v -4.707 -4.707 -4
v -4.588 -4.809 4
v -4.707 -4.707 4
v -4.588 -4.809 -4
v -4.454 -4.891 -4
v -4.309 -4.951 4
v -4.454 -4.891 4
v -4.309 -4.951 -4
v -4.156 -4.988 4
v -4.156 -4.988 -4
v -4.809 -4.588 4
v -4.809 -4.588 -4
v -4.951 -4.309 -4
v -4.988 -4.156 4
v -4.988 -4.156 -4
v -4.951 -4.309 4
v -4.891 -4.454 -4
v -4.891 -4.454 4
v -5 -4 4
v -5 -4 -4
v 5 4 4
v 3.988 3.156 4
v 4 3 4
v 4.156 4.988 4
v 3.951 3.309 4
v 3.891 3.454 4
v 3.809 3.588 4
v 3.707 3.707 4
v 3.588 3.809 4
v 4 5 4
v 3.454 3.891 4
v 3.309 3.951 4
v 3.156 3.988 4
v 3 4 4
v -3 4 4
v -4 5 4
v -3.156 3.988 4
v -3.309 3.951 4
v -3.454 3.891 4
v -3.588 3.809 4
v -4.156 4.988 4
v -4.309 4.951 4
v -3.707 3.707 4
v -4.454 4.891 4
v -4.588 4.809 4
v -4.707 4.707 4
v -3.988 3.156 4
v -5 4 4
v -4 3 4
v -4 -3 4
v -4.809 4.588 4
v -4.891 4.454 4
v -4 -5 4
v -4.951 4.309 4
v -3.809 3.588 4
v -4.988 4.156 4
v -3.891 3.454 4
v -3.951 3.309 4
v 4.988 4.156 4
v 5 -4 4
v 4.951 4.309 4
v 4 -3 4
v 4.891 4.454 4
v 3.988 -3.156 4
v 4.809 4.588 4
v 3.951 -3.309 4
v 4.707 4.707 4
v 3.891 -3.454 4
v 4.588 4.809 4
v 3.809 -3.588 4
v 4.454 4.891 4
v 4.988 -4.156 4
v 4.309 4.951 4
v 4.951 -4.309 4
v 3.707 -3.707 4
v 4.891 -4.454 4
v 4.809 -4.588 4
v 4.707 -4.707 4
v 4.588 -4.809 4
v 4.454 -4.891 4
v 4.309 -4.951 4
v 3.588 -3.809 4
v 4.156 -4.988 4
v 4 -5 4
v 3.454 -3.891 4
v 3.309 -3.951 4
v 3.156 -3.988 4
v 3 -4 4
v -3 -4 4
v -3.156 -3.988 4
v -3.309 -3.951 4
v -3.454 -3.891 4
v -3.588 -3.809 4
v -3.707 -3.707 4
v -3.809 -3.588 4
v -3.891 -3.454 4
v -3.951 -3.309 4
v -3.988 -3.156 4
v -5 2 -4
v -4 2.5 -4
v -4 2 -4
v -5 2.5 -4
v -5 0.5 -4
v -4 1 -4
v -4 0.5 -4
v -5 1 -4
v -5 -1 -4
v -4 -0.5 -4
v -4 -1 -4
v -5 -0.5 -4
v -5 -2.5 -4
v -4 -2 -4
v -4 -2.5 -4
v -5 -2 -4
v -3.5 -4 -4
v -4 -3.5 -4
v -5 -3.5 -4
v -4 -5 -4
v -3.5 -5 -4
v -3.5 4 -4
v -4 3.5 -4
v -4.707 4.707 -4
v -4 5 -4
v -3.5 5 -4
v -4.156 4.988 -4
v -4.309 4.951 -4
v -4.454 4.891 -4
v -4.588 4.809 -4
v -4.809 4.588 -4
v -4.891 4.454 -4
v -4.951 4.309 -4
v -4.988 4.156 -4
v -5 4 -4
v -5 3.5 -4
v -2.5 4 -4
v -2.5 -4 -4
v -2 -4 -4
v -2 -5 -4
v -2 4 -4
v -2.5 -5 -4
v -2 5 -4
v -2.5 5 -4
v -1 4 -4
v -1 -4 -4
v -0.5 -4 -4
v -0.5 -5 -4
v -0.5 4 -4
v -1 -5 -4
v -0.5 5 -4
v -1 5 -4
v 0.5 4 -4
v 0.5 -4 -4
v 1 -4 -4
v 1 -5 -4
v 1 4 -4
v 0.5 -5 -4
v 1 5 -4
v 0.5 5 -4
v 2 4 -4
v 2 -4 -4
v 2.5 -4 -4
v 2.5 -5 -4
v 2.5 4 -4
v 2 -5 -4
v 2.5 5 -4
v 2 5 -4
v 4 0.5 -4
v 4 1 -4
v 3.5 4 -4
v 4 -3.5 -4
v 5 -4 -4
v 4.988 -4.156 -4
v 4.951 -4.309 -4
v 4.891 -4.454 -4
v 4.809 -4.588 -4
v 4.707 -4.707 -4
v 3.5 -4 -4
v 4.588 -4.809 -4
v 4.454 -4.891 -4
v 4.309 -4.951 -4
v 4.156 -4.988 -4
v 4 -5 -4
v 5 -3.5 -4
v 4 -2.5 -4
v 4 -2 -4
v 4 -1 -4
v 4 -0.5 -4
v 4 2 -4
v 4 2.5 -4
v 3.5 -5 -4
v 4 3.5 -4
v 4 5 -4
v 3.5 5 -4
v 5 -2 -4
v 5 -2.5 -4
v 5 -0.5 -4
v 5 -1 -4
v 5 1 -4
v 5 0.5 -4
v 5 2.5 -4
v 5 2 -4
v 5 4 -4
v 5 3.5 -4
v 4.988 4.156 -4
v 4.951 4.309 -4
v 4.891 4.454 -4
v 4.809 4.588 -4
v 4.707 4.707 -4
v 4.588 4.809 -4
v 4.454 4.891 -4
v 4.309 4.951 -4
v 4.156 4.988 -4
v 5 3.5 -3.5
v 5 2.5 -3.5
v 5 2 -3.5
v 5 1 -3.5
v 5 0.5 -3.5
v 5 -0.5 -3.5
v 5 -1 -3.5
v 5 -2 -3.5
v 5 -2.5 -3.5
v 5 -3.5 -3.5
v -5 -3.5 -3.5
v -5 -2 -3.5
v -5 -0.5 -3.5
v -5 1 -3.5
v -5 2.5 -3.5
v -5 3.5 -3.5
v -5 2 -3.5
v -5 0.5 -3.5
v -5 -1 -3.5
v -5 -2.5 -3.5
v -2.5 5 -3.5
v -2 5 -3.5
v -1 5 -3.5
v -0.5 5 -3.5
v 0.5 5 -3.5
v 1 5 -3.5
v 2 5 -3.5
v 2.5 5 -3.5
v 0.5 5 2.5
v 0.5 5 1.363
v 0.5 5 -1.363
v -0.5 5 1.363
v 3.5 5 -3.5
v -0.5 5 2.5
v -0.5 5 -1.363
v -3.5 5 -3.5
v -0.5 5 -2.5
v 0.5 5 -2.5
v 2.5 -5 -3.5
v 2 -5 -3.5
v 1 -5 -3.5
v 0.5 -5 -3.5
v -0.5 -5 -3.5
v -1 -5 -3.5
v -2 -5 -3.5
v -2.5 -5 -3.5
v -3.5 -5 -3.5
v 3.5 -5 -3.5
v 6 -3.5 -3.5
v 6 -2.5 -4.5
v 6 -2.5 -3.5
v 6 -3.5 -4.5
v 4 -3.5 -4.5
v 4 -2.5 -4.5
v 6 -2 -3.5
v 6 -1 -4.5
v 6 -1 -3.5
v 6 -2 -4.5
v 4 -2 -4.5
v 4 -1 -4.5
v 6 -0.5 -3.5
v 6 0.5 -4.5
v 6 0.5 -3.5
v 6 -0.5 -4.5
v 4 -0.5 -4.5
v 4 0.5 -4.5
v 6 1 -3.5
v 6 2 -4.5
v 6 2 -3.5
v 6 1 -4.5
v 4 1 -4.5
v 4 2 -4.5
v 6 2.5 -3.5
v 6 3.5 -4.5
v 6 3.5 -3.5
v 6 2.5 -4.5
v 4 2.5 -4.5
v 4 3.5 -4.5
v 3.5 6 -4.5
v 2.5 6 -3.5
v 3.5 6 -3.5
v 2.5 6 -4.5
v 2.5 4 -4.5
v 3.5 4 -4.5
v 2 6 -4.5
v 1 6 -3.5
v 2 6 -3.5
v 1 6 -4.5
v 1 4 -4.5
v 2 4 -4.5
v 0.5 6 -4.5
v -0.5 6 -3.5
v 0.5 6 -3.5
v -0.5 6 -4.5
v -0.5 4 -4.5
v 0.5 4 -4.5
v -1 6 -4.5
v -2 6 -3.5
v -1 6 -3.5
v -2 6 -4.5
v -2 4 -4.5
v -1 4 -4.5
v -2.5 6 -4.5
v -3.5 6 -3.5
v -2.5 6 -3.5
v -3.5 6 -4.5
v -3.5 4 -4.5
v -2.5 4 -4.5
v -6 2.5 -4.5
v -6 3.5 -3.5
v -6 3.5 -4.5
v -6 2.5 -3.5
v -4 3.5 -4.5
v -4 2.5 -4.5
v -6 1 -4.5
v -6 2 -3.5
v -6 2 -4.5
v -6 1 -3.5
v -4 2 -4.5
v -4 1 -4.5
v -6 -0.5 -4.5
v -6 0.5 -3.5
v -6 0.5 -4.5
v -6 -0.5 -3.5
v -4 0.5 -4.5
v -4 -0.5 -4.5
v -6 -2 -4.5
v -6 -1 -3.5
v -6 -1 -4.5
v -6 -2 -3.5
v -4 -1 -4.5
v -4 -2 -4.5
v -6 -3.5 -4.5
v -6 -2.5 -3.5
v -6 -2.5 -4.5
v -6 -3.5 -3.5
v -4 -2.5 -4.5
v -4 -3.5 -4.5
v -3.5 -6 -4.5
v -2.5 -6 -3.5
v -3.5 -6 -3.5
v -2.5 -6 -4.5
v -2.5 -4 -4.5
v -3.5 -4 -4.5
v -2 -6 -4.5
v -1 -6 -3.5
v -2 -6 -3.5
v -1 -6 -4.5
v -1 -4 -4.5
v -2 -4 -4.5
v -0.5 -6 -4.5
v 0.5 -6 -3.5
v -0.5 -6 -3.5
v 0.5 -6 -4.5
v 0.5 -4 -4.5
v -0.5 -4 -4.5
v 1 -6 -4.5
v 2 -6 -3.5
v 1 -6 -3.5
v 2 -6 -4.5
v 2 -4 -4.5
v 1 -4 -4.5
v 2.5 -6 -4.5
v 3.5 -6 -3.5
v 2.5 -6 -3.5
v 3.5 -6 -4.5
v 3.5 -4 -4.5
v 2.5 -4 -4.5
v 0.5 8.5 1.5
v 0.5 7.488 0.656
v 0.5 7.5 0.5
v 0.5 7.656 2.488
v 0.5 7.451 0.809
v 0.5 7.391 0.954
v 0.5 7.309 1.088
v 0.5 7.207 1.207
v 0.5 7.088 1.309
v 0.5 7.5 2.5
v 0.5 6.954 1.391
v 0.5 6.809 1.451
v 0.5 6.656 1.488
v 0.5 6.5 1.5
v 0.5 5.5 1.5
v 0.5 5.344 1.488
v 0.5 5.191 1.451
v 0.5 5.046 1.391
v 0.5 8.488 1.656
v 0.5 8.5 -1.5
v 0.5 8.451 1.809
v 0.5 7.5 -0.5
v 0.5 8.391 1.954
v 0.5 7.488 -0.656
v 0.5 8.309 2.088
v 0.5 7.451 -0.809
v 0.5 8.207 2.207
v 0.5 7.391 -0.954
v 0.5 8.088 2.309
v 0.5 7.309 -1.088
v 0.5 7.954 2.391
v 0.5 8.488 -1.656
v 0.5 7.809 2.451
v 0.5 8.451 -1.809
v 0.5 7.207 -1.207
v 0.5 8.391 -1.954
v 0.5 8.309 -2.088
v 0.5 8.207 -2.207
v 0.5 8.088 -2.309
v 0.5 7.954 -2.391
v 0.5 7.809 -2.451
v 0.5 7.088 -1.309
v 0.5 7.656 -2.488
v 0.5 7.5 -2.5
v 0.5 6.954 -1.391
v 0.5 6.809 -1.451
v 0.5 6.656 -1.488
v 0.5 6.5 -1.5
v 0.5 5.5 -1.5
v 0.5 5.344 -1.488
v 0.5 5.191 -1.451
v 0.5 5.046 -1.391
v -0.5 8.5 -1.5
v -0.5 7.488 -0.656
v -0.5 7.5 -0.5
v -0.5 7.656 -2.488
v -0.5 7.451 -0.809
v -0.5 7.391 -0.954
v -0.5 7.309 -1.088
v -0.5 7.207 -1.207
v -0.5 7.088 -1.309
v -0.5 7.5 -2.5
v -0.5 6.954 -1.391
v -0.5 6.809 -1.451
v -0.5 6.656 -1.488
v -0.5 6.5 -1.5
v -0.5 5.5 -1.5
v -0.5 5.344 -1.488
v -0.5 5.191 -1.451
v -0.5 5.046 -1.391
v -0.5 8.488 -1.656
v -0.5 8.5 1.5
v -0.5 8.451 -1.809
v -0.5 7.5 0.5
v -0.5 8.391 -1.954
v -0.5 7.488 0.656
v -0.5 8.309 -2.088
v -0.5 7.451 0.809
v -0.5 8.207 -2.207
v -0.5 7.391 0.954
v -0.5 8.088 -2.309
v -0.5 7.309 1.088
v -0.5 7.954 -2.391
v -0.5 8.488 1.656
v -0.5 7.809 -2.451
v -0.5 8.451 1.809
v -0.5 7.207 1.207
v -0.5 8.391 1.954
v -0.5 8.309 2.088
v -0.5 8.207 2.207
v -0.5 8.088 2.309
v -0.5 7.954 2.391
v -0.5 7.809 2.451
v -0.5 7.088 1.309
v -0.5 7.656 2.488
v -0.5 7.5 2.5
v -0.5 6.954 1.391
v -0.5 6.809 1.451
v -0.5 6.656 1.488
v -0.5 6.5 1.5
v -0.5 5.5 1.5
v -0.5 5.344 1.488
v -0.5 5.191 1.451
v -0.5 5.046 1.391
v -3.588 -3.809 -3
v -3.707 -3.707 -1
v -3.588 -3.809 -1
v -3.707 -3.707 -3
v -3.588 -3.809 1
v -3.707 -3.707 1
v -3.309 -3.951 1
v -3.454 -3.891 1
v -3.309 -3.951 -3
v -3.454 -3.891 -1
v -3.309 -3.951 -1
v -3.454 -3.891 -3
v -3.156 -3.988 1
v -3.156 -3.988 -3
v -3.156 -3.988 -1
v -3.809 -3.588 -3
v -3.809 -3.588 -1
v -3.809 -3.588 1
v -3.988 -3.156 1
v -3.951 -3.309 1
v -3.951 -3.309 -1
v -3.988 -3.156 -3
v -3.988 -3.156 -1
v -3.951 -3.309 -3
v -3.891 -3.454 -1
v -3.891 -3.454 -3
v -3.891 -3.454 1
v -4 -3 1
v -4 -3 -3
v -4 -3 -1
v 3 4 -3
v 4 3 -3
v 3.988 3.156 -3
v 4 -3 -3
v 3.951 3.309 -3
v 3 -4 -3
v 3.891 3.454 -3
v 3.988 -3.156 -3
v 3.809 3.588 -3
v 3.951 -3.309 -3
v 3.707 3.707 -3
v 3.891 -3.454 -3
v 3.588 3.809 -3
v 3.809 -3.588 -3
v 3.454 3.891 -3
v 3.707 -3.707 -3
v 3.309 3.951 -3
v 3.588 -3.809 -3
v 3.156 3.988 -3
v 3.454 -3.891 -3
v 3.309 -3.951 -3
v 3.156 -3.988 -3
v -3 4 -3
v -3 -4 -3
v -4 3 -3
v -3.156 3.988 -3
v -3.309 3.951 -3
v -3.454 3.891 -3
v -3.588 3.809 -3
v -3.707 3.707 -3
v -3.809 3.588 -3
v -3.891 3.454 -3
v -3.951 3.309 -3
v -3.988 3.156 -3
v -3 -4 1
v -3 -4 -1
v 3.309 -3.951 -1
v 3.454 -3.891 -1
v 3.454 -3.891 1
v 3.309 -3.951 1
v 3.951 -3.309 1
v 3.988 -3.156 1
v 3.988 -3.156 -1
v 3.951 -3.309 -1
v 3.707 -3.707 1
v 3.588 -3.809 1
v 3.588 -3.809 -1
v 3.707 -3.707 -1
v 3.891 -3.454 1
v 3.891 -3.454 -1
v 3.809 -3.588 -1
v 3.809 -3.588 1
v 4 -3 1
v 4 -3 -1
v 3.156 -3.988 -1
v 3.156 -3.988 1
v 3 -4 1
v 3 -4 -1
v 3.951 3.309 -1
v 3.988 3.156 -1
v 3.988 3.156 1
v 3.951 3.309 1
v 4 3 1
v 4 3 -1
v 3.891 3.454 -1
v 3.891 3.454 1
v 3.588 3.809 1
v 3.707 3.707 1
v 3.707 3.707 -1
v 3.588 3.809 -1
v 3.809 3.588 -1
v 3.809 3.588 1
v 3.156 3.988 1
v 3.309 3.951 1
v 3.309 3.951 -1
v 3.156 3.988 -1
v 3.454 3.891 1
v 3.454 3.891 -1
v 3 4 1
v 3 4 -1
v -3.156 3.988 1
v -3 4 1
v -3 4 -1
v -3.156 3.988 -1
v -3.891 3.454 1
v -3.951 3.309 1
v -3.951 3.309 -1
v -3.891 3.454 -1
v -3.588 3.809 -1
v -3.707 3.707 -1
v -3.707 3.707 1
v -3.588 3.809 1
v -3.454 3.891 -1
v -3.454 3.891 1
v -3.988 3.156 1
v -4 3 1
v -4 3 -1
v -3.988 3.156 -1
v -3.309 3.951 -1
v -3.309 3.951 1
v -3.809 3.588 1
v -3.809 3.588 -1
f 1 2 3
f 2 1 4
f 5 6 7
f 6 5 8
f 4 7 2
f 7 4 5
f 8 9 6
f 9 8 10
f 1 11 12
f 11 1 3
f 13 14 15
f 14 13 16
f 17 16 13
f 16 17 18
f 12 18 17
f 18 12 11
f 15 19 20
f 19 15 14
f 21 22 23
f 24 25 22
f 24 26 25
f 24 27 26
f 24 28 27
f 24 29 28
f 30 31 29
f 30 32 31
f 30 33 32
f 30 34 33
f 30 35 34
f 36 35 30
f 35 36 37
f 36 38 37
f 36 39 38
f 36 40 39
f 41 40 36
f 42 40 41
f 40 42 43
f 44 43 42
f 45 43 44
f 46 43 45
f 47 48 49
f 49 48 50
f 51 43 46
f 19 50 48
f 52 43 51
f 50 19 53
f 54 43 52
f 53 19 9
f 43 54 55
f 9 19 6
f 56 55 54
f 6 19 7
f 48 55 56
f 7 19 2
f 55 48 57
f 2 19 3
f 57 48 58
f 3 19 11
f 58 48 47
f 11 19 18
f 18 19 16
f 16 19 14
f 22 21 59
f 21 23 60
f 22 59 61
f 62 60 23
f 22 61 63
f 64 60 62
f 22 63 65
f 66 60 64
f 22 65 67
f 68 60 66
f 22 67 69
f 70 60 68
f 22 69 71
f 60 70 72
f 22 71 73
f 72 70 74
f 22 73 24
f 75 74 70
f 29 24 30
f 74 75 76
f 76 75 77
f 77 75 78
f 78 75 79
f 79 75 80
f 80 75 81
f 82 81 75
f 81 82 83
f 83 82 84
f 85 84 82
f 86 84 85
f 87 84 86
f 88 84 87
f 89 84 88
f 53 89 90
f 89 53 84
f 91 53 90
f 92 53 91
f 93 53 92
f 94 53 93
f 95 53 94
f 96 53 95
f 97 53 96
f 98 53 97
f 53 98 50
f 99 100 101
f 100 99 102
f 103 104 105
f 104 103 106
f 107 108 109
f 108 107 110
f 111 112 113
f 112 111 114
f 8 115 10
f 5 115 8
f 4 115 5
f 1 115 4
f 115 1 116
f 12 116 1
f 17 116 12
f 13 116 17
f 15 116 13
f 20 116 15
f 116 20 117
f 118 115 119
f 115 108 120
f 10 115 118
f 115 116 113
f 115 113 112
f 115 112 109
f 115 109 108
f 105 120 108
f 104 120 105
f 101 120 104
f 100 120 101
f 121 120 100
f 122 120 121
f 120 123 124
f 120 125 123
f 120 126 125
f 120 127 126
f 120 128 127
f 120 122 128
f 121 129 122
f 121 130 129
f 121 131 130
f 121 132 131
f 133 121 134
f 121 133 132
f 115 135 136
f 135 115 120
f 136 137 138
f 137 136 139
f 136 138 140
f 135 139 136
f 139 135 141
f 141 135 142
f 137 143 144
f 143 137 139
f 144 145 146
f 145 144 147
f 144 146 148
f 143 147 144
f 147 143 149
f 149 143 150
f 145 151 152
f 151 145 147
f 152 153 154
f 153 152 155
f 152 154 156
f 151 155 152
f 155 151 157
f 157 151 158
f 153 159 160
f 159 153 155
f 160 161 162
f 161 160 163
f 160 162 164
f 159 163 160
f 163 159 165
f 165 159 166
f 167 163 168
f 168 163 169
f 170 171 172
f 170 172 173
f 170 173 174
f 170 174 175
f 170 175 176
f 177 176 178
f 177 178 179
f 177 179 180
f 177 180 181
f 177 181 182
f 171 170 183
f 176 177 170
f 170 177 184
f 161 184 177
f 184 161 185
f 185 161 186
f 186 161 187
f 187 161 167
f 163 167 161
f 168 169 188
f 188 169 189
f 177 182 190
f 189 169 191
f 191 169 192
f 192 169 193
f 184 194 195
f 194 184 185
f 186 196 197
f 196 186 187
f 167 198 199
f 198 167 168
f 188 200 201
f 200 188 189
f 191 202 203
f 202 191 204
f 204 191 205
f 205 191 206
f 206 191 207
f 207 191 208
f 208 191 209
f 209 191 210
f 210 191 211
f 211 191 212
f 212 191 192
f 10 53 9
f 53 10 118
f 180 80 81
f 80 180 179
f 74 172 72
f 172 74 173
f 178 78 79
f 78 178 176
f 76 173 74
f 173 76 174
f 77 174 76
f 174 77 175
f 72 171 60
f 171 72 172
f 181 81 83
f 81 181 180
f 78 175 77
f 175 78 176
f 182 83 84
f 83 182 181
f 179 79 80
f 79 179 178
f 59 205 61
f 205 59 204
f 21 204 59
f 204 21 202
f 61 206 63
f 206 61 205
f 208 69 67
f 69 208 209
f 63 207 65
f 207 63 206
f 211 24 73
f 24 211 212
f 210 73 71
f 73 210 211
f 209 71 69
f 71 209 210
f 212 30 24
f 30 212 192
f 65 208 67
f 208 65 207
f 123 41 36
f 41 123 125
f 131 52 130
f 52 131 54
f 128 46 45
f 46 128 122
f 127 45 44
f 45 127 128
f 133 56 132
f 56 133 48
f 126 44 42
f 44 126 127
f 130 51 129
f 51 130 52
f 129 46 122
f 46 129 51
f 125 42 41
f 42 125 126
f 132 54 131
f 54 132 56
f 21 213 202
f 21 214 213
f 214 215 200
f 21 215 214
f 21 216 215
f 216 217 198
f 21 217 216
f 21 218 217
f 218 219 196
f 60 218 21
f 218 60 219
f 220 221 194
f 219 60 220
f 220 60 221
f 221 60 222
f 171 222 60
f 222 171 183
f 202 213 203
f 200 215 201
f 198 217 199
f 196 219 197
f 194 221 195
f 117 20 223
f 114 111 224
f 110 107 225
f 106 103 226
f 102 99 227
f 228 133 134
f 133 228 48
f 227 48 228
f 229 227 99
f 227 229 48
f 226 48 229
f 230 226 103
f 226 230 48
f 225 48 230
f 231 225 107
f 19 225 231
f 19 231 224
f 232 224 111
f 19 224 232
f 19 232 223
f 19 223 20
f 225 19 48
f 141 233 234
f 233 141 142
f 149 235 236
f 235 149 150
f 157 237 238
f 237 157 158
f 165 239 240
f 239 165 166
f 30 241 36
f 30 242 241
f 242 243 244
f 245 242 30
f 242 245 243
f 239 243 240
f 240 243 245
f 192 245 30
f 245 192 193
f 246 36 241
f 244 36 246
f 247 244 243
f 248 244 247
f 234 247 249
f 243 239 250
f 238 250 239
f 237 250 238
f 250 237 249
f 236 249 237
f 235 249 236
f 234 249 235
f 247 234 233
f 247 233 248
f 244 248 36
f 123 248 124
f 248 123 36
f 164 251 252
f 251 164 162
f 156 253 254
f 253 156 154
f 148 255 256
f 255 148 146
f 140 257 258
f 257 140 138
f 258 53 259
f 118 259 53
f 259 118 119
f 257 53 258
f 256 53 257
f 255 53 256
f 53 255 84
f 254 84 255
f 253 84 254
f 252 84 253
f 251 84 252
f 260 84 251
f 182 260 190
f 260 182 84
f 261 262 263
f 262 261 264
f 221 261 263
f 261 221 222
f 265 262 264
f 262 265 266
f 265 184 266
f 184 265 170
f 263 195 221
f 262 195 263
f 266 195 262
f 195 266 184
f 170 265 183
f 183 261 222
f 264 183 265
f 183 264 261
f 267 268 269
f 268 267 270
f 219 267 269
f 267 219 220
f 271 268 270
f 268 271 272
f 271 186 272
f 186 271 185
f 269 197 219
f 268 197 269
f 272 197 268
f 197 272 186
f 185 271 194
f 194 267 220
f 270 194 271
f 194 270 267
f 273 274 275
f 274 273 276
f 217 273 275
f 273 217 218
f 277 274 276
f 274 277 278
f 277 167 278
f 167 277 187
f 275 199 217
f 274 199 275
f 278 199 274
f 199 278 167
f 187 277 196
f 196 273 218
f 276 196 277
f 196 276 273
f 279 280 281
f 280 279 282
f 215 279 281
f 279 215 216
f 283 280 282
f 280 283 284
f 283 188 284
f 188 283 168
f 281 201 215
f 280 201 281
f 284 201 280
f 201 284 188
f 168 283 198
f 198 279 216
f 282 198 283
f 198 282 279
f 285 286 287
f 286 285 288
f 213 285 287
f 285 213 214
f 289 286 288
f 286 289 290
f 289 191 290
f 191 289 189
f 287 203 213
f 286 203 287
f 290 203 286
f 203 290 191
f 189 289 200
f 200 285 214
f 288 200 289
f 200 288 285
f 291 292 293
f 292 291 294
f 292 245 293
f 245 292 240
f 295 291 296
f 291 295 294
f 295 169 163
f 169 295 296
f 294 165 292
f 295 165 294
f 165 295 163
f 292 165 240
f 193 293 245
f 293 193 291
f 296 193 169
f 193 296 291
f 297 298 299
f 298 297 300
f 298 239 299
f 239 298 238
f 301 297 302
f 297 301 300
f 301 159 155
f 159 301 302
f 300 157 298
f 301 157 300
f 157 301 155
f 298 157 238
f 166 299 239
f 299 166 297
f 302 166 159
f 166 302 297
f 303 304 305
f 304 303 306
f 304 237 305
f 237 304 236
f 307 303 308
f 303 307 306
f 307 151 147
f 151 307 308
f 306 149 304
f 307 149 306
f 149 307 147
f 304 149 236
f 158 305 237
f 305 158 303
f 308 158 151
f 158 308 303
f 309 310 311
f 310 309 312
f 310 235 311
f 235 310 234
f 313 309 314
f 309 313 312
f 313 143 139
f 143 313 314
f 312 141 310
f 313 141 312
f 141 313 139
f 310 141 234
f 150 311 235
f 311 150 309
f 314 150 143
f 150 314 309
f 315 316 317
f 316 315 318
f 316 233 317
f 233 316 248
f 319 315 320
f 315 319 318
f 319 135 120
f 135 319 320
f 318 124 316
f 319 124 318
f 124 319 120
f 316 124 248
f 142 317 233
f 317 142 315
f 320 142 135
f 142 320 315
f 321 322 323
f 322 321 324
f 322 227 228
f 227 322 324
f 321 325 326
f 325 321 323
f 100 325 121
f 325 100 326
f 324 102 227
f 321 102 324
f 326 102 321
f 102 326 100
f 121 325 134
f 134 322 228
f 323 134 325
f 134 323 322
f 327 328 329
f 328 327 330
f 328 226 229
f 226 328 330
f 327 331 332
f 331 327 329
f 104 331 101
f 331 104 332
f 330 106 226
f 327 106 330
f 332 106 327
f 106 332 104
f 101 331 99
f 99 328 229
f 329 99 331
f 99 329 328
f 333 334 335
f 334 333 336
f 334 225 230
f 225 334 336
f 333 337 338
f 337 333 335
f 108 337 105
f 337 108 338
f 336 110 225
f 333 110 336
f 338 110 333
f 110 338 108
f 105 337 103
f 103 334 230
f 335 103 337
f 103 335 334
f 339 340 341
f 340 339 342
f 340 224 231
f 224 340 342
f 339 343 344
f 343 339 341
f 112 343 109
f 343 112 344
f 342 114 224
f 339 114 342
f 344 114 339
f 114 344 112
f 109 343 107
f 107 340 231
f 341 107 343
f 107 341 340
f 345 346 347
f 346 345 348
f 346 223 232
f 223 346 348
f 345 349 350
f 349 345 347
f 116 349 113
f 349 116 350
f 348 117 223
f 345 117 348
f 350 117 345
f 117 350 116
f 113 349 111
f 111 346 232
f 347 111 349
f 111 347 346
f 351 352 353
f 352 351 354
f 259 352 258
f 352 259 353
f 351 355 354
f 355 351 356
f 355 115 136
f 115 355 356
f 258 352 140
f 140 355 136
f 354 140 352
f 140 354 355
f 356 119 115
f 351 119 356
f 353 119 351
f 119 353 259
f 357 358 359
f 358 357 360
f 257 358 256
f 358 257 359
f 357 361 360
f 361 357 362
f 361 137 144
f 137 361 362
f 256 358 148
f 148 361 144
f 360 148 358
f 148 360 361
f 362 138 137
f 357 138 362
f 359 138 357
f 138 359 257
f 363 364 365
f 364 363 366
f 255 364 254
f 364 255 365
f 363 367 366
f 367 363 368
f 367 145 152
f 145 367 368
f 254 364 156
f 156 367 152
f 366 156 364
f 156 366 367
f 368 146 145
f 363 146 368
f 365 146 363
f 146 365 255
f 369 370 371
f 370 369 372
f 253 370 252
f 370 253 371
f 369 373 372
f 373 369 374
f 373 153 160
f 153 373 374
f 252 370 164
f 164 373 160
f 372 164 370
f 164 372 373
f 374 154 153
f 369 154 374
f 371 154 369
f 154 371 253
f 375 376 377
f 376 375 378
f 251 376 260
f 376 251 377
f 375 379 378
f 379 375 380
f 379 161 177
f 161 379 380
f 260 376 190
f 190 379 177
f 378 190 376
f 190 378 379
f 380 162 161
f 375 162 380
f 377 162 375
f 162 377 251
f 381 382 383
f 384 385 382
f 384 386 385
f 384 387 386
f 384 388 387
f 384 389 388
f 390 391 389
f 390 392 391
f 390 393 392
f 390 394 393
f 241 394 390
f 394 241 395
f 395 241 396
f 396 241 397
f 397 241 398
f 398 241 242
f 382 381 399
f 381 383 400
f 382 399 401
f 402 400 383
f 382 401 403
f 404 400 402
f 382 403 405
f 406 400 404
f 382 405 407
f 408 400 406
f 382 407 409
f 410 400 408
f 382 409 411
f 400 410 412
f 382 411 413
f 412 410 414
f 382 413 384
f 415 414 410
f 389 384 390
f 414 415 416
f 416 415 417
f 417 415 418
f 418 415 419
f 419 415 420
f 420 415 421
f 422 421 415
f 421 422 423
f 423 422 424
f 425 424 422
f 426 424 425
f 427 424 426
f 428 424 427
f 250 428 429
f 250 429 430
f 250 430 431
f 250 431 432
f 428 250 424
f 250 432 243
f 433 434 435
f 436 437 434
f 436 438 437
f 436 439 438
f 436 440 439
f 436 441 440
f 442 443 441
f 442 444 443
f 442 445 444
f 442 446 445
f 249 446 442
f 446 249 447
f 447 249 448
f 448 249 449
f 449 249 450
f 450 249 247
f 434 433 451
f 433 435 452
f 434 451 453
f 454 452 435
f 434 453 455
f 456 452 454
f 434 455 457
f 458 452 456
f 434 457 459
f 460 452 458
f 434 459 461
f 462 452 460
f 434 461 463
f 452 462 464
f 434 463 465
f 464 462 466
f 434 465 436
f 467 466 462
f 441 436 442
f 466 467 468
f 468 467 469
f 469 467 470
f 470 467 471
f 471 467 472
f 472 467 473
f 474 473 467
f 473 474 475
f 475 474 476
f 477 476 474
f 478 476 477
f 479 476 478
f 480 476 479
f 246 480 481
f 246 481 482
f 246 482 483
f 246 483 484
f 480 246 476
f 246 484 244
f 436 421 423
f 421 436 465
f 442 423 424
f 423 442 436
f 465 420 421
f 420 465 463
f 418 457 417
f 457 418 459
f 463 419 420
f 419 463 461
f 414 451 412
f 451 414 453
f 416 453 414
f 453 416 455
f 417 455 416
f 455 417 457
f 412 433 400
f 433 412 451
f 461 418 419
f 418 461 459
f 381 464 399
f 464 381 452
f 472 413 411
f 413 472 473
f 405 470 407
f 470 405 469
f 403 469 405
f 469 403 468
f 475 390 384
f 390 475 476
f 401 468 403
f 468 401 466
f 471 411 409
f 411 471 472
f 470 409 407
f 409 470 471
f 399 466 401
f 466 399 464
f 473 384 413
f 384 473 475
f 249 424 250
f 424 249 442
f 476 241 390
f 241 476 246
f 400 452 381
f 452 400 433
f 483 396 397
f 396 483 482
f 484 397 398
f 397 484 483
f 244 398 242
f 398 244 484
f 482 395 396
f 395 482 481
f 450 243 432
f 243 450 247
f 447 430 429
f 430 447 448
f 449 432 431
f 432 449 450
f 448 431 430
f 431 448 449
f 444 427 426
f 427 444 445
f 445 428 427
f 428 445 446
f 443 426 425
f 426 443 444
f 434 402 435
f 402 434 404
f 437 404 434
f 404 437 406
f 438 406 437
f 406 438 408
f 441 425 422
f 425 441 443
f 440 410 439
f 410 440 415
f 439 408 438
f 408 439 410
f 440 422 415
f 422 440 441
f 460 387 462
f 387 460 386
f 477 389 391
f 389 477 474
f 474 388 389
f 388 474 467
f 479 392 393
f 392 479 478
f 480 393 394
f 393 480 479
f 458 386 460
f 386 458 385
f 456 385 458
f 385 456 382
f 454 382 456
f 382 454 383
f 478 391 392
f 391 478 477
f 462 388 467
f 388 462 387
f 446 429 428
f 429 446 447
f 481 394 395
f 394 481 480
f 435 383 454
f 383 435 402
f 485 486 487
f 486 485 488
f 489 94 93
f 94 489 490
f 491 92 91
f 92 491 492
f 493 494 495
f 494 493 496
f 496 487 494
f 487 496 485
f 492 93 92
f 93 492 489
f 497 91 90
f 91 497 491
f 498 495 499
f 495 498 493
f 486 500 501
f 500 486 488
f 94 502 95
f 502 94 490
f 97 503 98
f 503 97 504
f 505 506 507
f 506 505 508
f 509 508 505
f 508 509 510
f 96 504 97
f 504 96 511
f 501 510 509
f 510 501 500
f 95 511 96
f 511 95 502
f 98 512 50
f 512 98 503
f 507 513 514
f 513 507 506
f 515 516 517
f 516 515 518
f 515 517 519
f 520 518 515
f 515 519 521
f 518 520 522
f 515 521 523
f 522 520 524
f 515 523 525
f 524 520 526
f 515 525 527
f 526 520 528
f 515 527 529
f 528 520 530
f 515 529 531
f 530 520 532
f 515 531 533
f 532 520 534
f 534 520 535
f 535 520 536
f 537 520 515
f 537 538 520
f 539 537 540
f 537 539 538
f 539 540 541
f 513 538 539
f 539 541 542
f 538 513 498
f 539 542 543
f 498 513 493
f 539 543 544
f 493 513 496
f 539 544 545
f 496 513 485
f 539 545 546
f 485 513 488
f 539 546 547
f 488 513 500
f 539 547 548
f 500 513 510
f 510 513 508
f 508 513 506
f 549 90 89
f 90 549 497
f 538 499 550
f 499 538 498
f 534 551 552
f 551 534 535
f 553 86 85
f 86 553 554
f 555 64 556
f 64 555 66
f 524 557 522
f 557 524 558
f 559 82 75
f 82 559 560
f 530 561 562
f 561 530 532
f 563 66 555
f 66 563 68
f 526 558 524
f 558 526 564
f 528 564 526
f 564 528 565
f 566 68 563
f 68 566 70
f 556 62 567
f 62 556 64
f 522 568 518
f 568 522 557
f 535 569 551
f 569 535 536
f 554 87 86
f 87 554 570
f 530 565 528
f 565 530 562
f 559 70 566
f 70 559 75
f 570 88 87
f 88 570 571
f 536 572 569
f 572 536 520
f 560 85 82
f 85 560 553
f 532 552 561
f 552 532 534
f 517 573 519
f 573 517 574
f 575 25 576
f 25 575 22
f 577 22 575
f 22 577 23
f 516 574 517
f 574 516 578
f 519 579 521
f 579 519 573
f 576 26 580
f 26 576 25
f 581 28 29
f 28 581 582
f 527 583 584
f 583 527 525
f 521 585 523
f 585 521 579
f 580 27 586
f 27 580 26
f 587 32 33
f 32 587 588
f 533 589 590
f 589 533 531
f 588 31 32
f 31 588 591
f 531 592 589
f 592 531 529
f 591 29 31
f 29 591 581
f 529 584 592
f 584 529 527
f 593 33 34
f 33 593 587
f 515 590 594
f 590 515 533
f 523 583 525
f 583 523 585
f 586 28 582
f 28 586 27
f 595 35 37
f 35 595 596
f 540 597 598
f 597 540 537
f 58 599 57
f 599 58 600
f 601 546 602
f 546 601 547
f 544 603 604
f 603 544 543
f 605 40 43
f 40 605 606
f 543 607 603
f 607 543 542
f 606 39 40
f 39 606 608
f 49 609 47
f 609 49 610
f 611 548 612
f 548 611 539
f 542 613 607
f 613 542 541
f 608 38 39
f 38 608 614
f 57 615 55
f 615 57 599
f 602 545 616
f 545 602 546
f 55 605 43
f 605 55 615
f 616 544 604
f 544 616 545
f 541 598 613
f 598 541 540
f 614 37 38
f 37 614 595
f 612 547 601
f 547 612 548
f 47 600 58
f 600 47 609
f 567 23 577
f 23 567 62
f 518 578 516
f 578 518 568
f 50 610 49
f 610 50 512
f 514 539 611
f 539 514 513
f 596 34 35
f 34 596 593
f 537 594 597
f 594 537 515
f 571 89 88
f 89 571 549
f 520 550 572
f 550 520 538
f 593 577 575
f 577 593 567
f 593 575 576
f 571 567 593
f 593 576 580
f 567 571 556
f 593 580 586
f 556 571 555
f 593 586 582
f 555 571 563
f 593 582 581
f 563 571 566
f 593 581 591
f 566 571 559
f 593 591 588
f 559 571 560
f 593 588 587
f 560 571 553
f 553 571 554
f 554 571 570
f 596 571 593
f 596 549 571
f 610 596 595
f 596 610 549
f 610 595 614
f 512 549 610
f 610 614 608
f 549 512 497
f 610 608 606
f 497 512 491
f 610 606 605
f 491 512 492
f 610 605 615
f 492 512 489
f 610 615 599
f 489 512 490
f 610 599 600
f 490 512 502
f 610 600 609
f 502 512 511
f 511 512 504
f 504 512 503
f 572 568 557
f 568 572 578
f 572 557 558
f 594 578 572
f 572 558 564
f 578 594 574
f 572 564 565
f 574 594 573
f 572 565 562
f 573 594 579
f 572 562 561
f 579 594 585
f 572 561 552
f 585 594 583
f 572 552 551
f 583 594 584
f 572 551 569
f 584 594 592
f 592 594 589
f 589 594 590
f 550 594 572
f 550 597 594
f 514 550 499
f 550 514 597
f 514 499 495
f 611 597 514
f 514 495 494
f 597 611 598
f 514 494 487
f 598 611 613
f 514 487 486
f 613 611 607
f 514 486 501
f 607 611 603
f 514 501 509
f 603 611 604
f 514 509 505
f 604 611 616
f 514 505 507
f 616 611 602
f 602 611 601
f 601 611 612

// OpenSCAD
$fn=40;

module roundcube(W,H,R) {
 color("white") union() {
  translate([-W/2,-W/2,0]) cylinder(h=H,r=R,center=true);
  translate([W/2,-W/2,0]) cylinder(h=H,r=R,center=true);
  translate([W/2,W/2,0]) cylinder(h=H,r=R,center=true);
  translate([-W/2,W/2,0]) cylinder(h=H,r=R,center=true);
  cube([W+R*2,W,H],center=true);
  cube([W,W+R*2,H],center=true);
 }
}

module feet(X,H) {
 S=[2,1,1];
 XX=X/2+1;
 HH=-H/2;
 color("#303030") union() {
  translate([XX,-3,HH]) cube(S,center=true);
  translate([XX,-1.5,HH]) cube(S,center=true);
  translate([XX,0,HH]) cube(S,center=true);
  translate([XX,1.5,HH]) cube(S,center=true);
  translate([XX,3,HH]) cube(S,center=true);
 }
}

difference() {
 union() {
  roundcube(8,8,1);
  rotate([0,0,0]) feet(8,8);
  rotate([0,0,90]) feet(8,8);
  rotate([0,0,180]) feet(8,8);
  rotate([0,0,270]) feet(8,8);
  difference() {
   translate([0,6,0]) rotate([0,90,0]) roundcube(3,1,1);
   translate([0,6,0]) rotate([0,90,0]) roundcube(1,2,1);
  }
 }
 translate([0,0,1]) roundcube(6,8,1);
}
color("brown") roundcube(6,2,1);
